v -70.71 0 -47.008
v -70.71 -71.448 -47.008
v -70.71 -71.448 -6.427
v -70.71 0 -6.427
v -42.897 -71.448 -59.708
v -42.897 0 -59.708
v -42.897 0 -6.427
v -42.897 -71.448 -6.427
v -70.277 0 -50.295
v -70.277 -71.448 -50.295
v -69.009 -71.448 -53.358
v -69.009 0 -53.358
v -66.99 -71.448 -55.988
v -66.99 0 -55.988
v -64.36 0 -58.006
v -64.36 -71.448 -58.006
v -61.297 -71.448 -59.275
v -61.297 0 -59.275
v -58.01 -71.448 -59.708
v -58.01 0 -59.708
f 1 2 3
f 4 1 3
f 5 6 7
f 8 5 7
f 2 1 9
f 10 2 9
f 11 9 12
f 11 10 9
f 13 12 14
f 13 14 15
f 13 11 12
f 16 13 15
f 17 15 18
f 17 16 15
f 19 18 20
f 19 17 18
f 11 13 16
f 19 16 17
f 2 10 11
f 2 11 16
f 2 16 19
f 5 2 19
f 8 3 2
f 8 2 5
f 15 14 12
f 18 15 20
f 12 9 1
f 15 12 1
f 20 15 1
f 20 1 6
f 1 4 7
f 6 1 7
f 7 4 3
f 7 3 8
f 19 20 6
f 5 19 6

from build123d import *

# Parameters (mm, degrees)
F0_W     = 27.8132706881
F0_H     = 53.2805174589
F1_DEPTH = 71.4483186603
F2_R     = 12.7


# Not quite as in the source:
# - the program builds the solid bodies; features that only make, move or delete a surface that nothing else refers to are left out


with BuildPart() as f1:
    # F0 (on Front) → F1 (new body)
    with BuildSketch(Plane.XZ):
        with Locations((-56.8034946918, -33.0673083663)):
            Rectangle(F0_W, F0_H)
    extrude(amount=F1_DEPTH)

    # F2
    f2_edges = [f1.edges().sort_by_distance(p)[0] for p in [
        (-70.71013, -35.724159, -59.707567),
    ]]
    fillet(f2_edges, radius=F2_R)


solid = f1.part
